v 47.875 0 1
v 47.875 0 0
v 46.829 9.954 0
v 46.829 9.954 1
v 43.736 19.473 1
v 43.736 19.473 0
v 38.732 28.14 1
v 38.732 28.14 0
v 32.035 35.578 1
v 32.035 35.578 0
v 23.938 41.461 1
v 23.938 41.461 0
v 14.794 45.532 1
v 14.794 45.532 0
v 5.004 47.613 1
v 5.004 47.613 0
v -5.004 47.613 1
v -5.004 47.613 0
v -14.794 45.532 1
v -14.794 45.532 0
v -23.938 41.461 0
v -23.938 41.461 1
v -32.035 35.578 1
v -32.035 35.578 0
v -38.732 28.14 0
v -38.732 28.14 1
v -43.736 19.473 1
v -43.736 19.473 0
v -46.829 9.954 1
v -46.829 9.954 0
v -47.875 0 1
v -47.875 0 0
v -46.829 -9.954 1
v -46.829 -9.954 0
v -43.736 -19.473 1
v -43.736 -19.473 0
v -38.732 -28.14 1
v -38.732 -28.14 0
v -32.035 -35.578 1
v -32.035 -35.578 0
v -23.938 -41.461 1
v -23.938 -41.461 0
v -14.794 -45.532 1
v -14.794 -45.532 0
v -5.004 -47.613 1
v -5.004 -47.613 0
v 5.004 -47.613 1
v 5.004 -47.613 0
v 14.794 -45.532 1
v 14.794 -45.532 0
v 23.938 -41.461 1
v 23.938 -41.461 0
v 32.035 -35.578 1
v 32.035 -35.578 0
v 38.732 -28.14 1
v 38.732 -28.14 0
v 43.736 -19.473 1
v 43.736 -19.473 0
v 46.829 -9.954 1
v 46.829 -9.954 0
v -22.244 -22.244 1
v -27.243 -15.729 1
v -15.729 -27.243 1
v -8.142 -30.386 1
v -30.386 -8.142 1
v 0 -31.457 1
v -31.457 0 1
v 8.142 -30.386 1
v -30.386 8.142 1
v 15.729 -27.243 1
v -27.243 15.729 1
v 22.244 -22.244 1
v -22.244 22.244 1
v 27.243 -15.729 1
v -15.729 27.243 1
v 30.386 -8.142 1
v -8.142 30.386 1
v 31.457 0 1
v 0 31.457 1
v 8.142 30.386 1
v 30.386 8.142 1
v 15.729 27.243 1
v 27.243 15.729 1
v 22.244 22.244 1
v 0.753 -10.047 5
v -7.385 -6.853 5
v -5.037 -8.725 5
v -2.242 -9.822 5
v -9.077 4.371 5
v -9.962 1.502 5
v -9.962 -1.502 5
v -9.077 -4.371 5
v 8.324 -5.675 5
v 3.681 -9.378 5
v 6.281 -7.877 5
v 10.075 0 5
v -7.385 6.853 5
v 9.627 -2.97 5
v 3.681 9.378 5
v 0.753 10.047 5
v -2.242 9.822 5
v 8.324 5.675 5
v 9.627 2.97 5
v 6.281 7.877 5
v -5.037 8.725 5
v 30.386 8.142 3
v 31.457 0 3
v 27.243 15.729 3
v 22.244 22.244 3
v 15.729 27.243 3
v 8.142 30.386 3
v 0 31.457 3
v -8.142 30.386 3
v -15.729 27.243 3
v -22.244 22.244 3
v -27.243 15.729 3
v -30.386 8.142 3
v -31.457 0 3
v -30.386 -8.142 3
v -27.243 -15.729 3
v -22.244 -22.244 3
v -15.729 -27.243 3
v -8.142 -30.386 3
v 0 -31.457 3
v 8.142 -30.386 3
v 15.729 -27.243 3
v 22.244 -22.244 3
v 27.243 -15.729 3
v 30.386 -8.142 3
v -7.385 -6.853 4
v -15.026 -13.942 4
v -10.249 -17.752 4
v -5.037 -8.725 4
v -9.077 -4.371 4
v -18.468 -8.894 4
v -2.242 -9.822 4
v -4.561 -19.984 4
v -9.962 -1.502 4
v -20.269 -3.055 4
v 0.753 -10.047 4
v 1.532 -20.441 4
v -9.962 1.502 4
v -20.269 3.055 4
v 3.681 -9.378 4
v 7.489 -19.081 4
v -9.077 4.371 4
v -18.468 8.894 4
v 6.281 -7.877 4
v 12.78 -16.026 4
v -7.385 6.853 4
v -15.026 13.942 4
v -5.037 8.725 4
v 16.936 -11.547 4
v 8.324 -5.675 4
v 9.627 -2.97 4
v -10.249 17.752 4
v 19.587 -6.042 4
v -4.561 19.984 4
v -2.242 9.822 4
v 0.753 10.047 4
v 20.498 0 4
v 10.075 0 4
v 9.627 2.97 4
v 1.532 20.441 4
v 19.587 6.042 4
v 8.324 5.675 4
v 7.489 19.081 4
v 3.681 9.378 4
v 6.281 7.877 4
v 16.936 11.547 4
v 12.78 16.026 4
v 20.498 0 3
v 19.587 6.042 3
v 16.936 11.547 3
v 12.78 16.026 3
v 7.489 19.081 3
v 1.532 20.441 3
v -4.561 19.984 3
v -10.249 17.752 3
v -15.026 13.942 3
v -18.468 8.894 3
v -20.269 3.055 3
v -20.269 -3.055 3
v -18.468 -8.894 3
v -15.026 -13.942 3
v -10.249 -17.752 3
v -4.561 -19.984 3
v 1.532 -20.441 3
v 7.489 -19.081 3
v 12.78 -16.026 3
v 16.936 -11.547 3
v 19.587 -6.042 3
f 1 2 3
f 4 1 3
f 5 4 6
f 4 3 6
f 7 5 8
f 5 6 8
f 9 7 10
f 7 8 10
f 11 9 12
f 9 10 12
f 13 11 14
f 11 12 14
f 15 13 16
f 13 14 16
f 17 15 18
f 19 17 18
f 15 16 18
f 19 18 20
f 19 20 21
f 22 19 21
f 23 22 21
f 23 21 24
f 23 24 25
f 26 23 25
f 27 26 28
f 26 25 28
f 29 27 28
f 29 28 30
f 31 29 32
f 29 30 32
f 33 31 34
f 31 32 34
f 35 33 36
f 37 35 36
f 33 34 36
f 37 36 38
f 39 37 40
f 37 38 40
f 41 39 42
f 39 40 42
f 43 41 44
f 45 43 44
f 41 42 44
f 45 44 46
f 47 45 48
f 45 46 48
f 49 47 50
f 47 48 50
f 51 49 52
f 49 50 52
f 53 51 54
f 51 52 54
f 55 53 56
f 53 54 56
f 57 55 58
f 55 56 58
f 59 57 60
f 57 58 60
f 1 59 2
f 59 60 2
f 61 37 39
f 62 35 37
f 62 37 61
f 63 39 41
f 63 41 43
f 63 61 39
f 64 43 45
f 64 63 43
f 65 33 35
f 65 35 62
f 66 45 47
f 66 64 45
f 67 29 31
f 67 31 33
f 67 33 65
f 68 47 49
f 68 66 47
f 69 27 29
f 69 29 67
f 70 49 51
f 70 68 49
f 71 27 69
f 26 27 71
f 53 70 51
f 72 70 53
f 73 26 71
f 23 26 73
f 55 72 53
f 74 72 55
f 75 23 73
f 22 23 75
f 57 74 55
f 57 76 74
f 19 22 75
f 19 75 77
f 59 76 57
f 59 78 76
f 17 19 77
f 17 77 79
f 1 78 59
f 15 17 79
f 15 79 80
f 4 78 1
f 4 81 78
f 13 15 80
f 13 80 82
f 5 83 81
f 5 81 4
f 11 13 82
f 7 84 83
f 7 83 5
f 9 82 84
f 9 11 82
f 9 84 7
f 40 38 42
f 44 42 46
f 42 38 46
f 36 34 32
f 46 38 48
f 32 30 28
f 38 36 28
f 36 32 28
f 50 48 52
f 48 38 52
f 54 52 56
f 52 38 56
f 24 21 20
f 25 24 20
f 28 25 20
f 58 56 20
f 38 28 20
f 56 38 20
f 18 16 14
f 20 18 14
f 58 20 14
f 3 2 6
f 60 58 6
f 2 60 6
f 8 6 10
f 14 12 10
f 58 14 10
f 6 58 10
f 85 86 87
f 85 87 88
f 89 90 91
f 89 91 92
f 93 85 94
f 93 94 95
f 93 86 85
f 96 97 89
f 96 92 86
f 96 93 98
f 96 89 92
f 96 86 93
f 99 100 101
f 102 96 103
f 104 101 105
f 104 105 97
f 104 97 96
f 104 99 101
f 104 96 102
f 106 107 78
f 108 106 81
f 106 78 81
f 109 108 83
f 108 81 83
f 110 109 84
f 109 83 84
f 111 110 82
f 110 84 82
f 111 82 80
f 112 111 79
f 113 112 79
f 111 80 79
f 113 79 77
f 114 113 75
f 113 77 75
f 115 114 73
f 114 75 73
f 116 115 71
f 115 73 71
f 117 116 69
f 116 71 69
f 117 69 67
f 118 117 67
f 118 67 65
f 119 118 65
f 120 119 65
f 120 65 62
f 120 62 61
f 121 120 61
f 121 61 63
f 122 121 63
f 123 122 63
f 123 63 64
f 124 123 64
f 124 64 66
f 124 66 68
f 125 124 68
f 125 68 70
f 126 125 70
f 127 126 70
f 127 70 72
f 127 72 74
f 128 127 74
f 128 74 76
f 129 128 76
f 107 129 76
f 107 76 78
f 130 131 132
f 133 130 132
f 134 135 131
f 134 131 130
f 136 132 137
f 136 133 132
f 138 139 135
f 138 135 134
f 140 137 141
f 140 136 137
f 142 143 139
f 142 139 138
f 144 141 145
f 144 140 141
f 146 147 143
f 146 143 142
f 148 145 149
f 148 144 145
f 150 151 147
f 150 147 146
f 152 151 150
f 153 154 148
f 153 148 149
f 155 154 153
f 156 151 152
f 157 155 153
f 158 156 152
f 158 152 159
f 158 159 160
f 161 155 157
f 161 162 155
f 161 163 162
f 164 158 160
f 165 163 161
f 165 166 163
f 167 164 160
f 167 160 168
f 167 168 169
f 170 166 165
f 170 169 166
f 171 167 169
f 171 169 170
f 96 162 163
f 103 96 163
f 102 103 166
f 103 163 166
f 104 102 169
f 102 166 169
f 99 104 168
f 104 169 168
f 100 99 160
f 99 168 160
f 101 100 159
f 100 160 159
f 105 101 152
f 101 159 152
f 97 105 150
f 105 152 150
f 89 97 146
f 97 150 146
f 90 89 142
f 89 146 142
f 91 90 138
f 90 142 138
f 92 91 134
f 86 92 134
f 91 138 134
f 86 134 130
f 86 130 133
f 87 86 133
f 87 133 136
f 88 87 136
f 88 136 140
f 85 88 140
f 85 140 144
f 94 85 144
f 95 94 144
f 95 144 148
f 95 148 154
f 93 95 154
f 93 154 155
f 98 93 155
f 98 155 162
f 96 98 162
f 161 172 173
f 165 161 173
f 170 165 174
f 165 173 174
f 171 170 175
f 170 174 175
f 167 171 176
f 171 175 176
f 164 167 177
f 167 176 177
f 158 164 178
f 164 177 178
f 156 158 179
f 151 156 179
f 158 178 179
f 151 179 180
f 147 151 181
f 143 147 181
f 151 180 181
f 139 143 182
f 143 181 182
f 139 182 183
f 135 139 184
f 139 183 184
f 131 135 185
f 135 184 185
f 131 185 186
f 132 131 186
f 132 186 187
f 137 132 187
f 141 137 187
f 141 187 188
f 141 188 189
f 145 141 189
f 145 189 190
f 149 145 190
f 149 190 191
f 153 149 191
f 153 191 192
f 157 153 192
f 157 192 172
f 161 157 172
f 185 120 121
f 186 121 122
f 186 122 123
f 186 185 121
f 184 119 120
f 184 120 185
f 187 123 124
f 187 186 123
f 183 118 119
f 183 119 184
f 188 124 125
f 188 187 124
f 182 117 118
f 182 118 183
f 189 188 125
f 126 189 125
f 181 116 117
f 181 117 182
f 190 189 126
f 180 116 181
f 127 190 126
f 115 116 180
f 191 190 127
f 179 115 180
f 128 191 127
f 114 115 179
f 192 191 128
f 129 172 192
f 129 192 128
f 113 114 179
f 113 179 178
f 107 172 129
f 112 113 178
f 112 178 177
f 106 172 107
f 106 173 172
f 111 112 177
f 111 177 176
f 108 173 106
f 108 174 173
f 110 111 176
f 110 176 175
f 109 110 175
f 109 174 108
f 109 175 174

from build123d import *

# Parameters (mm, degrees)
F0_R     = 47.875264
F1_DEPTH = 1
F2_R     = 31.457389
F3_DEPTH = 3
F4_R     = 20.49811
F5_DEPTH = 4
F6_R     = 10.07473
F7_DEPTH = 5


with BuildPart() as f1:
    # F0 (on Top) → F1 (new body)
    with BuildSketch(Plane.XY):
        Circle(F0_R)
    extrude(amount=F1_DEPTH)

    # F2 (on Top) → F3 (join)
    with BuildSketch(Plane.XY):
        Circle(F2_R)
    extrude(amount=F3_DEPTH)

    # F4 (on Top) → F5 (join)
    with BuildSketch(Plane.XY):
        Circle(F4_R)
    extrude(amount=F5_DEPTH)

    # F6 (on Top) → F7 (join)
    with BuildSketch(Plane.XY):
        Circle(F6_R)
    extrude(amount=F7_DEPTH)


solid = f1.part
